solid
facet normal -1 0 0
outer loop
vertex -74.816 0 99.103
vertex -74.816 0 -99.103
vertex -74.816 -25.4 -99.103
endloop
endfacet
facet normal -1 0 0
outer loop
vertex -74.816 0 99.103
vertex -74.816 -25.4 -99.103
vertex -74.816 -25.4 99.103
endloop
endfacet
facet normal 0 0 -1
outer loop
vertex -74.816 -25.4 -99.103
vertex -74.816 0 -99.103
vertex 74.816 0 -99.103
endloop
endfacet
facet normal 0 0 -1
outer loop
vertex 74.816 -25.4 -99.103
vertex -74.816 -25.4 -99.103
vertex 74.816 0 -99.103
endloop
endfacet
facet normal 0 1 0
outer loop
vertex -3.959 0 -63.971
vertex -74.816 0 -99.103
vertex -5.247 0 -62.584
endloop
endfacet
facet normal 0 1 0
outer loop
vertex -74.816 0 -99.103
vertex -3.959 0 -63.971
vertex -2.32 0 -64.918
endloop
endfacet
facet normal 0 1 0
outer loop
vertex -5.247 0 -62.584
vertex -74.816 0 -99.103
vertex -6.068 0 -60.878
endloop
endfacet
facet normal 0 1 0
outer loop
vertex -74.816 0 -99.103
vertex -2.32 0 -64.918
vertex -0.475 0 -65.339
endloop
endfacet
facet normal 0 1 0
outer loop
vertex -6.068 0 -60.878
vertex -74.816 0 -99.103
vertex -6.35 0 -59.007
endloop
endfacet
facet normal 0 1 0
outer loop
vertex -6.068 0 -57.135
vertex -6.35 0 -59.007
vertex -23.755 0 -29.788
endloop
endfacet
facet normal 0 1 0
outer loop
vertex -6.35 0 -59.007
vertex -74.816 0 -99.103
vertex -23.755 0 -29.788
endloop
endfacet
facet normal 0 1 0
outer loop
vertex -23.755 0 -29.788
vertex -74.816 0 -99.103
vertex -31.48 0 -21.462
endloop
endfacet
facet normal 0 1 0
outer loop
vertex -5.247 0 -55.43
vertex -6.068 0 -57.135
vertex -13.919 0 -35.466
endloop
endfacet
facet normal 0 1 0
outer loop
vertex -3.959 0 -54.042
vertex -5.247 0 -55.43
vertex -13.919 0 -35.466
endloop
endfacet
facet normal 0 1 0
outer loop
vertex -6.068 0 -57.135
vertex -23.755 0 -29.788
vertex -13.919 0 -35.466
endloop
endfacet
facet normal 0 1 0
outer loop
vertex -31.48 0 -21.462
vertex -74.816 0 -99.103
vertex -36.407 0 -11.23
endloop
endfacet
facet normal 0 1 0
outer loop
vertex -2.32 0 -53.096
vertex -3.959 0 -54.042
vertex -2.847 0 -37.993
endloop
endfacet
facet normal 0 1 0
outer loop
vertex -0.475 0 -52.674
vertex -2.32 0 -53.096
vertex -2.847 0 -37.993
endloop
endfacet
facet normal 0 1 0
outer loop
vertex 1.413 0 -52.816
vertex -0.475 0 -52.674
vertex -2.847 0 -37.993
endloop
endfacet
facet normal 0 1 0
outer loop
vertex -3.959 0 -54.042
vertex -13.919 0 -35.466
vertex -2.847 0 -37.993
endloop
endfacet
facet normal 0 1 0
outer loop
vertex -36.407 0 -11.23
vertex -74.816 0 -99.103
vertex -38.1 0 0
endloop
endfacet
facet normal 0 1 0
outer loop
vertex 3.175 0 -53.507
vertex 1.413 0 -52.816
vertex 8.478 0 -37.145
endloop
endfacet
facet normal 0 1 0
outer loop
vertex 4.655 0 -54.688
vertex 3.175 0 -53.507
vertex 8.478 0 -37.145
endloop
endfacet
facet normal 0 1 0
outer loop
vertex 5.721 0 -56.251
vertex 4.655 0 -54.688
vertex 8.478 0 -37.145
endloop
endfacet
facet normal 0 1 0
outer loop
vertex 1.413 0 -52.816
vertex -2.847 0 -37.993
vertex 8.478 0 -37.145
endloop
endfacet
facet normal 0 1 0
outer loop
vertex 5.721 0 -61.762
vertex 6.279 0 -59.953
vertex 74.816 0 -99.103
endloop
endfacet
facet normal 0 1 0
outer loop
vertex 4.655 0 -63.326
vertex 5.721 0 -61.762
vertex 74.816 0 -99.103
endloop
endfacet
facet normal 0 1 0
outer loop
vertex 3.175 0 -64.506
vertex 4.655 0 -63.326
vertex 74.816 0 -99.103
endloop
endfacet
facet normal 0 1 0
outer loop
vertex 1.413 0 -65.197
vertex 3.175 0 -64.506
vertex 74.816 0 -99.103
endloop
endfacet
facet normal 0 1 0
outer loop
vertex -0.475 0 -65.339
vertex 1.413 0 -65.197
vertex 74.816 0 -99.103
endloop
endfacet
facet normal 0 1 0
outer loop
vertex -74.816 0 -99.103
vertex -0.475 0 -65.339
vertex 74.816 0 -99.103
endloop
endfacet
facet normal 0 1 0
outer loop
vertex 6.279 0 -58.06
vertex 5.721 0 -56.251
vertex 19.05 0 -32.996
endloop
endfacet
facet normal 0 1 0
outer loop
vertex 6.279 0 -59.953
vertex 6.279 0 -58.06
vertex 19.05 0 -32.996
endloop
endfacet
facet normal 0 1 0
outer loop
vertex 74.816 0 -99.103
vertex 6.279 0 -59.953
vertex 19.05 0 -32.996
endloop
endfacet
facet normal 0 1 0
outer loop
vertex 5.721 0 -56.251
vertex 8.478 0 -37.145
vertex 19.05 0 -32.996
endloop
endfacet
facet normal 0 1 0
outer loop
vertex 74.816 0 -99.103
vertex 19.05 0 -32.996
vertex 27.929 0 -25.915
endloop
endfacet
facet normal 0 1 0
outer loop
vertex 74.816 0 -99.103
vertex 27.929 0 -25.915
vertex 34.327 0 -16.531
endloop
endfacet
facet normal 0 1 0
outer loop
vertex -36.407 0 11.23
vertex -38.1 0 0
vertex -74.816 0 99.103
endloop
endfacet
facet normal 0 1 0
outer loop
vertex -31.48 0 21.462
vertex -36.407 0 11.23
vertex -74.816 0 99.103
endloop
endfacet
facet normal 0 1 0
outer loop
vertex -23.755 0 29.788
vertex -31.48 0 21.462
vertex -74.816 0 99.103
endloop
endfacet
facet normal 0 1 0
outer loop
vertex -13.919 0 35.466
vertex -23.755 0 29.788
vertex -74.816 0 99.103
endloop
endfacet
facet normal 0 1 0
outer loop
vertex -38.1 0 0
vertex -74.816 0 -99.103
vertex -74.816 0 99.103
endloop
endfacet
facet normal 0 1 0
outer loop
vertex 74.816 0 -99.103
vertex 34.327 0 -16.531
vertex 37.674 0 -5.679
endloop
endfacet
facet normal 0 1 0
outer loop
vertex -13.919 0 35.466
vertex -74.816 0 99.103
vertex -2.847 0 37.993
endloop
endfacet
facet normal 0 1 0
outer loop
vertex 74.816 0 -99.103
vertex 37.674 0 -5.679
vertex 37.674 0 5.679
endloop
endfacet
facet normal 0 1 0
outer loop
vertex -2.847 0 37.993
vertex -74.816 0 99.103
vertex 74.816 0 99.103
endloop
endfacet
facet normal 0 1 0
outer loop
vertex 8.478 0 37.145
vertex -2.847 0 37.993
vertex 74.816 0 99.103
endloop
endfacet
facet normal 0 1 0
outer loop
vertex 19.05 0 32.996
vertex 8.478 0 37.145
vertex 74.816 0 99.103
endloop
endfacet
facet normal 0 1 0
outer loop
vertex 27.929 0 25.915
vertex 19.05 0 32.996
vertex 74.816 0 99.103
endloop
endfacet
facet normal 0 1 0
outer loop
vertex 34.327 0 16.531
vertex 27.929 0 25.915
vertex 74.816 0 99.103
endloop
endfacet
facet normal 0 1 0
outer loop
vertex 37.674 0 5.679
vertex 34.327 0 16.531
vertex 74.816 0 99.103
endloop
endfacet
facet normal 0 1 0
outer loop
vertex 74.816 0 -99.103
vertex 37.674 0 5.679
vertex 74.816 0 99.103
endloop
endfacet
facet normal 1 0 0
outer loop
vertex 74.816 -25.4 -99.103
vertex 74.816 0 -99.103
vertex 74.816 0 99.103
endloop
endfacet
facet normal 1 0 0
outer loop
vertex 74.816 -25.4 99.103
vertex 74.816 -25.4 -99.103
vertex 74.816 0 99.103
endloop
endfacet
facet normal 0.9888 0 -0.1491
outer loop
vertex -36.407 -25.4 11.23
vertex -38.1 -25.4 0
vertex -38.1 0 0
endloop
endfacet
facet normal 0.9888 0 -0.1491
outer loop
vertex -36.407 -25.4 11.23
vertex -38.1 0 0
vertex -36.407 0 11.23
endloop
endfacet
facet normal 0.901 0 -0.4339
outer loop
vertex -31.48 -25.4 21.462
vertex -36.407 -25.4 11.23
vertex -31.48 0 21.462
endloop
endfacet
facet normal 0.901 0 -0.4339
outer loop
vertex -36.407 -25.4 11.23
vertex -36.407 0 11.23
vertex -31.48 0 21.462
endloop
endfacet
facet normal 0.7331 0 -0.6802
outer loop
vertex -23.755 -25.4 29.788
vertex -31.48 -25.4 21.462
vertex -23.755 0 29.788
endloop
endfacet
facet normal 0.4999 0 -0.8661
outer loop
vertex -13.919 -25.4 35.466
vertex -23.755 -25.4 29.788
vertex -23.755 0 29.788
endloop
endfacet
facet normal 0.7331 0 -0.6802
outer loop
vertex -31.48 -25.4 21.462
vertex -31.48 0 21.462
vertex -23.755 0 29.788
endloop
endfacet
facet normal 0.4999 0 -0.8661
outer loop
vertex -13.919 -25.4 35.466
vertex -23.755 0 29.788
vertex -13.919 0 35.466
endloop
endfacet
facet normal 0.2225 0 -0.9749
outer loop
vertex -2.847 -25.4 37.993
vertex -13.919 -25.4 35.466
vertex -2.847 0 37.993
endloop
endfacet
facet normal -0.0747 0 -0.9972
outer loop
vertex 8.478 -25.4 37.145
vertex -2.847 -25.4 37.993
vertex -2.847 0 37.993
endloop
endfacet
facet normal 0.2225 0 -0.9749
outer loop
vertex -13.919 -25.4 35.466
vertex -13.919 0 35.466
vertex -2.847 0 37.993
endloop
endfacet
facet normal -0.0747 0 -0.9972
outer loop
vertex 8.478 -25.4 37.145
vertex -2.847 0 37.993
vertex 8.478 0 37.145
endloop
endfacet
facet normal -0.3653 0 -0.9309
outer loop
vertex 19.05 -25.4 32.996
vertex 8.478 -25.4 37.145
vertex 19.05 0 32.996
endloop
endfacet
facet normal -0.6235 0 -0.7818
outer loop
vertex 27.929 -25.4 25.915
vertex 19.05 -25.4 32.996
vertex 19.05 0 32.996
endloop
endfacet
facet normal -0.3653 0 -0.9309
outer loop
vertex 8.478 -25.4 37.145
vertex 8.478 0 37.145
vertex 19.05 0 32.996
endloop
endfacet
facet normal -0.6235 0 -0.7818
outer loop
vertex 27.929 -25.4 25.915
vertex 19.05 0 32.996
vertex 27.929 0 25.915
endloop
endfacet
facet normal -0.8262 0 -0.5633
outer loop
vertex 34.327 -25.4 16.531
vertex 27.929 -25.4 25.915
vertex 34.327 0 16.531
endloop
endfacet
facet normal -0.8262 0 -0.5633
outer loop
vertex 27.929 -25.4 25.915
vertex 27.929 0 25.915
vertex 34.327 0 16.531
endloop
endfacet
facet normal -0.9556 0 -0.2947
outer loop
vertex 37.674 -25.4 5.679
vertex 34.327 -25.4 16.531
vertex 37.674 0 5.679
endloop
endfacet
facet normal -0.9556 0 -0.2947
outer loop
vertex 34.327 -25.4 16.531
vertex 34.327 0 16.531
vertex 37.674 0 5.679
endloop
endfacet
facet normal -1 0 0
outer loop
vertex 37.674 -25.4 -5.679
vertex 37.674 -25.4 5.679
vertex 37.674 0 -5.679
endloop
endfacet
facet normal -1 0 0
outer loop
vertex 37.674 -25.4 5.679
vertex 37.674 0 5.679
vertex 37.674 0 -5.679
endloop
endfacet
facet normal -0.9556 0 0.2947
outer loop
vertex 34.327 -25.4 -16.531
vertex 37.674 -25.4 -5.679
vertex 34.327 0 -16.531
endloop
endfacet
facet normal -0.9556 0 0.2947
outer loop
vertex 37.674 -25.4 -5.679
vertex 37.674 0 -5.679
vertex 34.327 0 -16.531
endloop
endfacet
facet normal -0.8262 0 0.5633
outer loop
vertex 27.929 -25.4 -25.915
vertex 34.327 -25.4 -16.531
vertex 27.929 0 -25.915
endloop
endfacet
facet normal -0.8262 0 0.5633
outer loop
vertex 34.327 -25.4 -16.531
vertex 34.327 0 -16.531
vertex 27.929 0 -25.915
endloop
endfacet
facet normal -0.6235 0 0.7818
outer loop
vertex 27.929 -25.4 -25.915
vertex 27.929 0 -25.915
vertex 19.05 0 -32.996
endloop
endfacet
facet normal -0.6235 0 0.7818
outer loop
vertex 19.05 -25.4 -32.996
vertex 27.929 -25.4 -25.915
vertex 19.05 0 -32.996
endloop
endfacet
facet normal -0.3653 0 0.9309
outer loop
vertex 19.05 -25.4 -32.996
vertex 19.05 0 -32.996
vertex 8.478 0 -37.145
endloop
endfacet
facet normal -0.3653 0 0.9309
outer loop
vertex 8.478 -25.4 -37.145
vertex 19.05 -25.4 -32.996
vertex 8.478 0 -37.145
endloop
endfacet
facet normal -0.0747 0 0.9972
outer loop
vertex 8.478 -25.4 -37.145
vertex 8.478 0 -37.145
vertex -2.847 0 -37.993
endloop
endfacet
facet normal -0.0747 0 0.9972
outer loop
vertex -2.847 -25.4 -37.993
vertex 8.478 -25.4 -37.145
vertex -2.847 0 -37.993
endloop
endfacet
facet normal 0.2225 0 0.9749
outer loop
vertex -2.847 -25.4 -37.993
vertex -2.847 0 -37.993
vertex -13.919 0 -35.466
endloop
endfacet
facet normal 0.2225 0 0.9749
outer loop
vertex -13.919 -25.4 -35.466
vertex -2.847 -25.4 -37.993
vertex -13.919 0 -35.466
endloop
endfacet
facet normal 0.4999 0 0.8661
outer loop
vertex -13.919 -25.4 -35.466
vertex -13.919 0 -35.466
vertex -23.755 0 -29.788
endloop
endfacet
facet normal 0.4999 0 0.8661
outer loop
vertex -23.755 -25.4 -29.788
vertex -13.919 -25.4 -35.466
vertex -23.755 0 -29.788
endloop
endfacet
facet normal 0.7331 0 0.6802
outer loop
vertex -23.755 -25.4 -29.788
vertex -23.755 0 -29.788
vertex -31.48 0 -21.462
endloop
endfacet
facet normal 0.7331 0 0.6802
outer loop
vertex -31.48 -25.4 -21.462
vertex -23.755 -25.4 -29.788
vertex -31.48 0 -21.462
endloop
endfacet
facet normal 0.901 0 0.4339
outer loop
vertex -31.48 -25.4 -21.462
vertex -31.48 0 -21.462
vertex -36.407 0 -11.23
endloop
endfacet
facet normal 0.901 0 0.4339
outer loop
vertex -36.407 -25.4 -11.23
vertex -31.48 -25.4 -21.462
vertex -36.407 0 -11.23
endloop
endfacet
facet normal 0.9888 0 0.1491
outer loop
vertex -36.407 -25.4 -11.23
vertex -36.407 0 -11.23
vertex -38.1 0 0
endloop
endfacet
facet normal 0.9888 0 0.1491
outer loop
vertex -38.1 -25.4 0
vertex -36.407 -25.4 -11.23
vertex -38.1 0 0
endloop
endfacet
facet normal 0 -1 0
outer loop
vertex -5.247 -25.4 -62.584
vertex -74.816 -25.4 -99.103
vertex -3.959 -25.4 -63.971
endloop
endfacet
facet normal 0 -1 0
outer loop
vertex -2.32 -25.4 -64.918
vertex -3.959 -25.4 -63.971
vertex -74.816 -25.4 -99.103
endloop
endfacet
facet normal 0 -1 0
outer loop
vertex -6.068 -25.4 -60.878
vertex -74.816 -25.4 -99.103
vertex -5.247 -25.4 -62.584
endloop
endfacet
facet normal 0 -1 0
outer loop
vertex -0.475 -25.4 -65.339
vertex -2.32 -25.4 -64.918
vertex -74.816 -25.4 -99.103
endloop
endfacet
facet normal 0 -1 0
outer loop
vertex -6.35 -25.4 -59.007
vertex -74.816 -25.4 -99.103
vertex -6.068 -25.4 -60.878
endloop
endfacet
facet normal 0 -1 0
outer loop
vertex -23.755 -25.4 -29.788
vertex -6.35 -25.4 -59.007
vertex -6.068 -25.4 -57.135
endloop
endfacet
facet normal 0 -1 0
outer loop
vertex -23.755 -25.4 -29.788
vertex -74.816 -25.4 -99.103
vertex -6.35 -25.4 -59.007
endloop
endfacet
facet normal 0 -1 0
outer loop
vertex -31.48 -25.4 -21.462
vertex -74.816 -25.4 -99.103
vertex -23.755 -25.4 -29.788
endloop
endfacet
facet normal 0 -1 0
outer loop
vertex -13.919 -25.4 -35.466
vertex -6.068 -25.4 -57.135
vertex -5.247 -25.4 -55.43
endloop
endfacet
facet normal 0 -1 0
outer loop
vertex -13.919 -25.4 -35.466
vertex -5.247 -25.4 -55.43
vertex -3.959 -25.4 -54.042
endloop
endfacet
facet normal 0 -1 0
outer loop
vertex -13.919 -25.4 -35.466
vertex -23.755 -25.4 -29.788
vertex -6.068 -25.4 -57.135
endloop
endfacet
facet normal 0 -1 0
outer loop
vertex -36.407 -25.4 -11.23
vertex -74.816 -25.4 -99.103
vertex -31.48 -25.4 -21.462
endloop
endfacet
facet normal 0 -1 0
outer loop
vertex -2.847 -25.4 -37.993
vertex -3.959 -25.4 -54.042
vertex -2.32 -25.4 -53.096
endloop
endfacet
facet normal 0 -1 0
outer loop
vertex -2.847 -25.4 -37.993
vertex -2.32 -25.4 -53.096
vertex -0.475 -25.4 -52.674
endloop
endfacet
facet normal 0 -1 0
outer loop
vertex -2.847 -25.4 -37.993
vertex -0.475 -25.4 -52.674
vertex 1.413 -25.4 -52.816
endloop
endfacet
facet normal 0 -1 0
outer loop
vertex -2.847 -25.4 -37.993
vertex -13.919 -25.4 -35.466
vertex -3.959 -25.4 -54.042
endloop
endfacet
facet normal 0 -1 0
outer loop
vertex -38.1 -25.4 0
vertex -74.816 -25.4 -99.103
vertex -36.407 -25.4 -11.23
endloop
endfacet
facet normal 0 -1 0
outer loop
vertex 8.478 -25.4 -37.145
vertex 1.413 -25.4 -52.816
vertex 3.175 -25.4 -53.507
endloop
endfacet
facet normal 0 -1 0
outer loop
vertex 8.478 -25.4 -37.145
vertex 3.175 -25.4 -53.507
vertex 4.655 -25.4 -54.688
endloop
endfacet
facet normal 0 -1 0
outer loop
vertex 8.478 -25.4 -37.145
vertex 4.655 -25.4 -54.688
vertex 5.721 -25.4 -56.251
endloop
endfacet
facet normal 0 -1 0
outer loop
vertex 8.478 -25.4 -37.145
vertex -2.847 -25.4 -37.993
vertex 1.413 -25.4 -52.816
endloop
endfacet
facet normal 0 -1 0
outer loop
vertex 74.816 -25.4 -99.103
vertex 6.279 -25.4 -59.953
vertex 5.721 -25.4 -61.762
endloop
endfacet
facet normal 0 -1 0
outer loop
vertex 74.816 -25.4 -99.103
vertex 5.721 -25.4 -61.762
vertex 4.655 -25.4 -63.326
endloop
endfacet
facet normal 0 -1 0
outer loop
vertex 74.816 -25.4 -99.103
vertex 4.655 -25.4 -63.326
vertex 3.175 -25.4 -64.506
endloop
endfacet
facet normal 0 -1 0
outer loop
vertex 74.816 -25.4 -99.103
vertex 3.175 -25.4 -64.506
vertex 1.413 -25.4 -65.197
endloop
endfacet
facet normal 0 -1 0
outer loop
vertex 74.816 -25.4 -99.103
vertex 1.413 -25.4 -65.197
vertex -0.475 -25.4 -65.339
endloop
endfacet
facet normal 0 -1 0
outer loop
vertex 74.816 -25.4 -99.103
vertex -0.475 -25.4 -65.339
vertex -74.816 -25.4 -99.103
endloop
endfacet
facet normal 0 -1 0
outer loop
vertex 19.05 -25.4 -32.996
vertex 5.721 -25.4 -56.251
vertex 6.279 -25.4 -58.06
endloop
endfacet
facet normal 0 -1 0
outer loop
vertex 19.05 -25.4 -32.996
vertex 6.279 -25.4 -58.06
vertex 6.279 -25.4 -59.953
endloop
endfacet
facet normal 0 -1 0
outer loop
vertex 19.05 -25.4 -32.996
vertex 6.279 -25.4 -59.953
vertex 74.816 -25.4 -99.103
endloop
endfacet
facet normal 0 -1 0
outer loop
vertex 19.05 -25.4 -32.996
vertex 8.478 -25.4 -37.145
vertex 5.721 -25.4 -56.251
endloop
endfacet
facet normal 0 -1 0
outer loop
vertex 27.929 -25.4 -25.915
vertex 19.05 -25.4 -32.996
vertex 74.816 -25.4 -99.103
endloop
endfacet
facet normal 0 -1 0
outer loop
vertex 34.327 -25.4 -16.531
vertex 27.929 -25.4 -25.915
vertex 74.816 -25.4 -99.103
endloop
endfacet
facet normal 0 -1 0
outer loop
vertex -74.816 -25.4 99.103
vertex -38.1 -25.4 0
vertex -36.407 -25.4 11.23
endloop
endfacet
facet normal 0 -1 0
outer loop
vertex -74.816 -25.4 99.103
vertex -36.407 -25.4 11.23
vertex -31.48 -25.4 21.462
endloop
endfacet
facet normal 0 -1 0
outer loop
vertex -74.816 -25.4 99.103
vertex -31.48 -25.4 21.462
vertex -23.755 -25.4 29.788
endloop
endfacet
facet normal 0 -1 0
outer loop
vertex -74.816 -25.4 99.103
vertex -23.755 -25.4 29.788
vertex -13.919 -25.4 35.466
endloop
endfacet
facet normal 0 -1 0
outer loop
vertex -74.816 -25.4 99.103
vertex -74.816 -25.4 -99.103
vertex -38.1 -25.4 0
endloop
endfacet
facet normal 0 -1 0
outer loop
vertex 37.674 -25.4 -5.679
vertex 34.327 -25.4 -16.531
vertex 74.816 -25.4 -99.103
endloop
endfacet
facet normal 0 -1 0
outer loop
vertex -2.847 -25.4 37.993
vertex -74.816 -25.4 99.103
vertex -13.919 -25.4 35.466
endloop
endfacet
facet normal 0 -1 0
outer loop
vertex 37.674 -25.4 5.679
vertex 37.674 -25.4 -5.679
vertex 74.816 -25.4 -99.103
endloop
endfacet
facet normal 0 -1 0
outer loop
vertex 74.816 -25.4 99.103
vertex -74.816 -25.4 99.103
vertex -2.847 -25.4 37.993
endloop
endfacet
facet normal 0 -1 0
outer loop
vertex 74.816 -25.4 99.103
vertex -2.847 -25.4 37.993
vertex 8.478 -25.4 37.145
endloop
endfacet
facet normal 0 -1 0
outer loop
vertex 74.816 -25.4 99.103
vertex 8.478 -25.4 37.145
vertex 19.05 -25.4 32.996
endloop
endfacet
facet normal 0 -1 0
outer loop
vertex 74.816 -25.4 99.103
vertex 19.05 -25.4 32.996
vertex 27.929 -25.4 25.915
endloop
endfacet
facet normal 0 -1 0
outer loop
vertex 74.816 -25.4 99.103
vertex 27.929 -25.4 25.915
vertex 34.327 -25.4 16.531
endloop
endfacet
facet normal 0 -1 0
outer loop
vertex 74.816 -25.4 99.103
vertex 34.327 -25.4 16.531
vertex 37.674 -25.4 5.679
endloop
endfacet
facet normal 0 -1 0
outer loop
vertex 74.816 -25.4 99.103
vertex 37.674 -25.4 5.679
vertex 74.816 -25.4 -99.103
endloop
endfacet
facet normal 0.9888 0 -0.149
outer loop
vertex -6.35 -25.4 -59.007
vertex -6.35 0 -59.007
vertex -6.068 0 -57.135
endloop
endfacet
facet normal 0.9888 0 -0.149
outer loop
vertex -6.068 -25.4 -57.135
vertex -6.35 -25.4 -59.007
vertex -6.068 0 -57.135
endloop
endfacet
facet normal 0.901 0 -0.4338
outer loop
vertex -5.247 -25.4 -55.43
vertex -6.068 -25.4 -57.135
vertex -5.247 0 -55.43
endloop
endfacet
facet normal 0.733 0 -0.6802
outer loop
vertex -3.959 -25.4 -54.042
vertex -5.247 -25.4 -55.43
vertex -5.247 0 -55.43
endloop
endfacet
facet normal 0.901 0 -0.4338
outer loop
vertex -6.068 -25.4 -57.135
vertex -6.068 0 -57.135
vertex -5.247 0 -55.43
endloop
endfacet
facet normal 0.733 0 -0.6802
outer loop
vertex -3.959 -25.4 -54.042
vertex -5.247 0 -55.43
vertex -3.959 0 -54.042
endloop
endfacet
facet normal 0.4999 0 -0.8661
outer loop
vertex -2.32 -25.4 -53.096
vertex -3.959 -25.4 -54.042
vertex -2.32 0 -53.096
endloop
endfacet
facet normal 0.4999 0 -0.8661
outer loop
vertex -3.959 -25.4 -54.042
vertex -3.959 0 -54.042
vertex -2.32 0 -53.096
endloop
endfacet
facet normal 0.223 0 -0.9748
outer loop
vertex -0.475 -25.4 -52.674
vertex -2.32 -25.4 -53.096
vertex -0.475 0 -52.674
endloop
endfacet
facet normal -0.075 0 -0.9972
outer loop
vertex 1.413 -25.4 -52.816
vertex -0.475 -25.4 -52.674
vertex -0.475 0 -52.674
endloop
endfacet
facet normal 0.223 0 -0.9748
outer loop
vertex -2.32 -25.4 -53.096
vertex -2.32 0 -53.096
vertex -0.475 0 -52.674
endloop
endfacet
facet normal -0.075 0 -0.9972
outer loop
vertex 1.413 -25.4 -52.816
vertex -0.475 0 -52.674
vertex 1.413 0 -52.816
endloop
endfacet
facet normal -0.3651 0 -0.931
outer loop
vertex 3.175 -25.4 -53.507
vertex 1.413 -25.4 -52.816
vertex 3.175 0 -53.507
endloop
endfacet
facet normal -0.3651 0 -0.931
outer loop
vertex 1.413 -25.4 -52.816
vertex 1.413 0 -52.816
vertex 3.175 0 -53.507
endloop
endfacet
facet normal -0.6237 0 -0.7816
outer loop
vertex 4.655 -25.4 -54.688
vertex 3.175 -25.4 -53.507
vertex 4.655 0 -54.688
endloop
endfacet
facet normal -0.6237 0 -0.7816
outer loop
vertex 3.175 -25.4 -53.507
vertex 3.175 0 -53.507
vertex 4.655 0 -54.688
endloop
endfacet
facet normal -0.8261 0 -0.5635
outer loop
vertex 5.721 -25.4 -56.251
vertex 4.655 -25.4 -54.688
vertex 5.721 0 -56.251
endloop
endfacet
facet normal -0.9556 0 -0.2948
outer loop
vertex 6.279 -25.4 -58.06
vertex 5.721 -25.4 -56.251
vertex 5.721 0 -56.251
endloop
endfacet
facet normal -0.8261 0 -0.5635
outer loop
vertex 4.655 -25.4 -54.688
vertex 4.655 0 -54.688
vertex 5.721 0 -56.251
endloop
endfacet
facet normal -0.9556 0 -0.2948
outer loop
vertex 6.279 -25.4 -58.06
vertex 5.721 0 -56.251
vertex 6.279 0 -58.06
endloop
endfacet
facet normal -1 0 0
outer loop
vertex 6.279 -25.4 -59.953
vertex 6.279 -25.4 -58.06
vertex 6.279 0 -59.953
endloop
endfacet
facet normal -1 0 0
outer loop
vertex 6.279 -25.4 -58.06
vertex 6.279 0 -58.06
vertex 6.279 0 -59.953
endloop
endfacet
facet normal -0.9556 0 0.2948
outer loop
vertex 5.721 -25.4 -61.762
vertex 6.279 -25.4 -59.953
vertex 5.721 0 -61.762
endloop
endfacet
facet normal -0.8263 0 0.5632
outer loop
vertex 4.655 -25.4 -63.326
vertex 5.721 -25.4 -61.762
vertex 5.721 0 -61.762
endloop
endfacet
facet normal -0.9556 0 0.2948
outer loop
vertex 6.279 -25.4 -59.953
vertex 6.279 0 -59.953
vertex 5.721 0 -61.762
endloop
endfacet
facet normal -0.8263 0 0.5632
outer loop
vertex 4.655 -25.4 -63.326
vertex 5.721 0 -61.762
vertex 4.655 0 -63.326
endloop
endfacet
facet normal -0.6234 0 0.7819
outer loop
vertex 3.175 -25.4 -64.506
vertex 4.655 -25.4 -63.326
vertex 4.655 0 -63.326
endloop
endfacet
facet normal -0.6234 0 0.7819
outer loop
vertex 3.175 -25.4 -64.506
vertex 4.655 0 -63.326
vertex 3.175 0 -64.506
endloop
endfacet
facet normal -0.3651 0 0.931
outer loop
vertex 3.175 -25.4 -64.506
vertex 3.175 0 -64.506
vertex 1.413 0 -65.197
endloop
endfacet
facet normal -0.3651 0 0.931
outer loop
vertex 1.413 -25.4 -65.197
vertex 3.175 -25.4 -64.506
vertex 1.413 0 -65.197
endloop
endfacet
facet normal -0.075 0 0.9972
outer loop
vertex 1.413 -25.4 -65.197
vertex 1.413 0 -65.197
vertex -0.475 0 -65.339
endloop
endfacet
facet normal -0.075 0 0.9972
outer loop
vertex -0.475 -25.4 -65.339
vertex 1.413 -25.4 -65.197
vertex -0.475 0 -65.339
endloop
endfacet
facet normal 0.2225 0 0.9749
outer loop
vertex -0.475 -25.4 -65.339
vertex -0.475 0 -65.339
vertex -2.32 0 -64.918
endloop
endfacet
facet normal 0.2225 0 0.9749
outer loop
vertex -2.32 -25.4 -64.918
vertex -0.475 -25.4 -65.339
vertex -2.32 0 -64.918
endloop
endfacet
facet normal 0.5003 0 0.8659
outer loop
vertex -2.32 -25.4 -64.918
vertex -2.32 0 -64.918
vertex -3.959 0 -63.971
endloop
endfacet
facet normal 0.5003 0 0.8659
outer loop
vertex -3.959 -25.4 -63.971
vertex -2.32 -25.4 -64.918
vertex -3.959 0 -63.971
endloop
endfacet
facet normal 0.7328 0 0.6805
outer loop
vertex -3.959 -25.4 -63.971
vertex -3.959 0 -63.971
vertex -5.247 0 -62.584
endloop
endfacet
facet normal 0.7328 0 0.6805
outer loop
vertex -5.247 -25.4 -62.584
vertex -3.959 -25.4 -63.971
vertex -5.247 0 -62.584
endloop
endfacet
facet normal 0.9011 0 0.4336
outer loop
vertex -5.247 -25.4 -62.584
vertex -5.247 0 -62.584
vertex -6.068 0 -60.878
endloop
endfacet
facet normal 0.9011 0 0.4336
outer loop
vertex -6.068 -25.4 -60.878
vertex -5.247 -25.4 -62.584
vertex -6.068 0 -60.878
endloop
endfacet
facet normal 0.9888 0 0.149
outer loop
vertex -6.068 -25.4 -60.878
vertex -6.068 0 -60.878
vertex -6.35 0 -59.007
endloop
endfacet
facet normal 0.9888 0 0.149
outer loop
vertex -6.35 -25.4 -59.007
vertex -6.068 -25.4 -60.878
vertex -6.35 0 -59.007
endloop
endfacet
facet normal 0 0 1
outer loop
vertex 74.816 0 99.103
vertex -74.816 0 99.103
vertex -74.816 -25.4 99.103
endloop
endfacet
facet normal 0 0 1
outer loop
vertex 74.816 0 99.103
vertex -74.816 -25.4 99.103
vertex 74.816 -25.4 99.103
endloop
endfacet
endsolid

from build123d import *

# Parameters (mm, degrees)
F0_W     = 149.631724
F0_H     = 198.205128
F1_DEPTH = 25.4
F3_D     = 76.2
F5_D     = 12.7


with BuildPart() as f1:
    # F0 (on Front) → F1 (new body)
    with BuildSketch(Plane.XZ):
        Rectangle(F0_W, F0_H)
    extrude(amount=F1_DEPTH)

    # F3 (through all)
    with Locations(Plane.XZ.offset(25.4)):
        with Locations((0, 0)):
            Hole(F3_D / 2)

    # F5 (through all)
    with Locations(Plane.XZ.offset(25.4)):
        with Locations((0, -59.006654)):
            Hole(F5_D / 2)


solid = f1.part
